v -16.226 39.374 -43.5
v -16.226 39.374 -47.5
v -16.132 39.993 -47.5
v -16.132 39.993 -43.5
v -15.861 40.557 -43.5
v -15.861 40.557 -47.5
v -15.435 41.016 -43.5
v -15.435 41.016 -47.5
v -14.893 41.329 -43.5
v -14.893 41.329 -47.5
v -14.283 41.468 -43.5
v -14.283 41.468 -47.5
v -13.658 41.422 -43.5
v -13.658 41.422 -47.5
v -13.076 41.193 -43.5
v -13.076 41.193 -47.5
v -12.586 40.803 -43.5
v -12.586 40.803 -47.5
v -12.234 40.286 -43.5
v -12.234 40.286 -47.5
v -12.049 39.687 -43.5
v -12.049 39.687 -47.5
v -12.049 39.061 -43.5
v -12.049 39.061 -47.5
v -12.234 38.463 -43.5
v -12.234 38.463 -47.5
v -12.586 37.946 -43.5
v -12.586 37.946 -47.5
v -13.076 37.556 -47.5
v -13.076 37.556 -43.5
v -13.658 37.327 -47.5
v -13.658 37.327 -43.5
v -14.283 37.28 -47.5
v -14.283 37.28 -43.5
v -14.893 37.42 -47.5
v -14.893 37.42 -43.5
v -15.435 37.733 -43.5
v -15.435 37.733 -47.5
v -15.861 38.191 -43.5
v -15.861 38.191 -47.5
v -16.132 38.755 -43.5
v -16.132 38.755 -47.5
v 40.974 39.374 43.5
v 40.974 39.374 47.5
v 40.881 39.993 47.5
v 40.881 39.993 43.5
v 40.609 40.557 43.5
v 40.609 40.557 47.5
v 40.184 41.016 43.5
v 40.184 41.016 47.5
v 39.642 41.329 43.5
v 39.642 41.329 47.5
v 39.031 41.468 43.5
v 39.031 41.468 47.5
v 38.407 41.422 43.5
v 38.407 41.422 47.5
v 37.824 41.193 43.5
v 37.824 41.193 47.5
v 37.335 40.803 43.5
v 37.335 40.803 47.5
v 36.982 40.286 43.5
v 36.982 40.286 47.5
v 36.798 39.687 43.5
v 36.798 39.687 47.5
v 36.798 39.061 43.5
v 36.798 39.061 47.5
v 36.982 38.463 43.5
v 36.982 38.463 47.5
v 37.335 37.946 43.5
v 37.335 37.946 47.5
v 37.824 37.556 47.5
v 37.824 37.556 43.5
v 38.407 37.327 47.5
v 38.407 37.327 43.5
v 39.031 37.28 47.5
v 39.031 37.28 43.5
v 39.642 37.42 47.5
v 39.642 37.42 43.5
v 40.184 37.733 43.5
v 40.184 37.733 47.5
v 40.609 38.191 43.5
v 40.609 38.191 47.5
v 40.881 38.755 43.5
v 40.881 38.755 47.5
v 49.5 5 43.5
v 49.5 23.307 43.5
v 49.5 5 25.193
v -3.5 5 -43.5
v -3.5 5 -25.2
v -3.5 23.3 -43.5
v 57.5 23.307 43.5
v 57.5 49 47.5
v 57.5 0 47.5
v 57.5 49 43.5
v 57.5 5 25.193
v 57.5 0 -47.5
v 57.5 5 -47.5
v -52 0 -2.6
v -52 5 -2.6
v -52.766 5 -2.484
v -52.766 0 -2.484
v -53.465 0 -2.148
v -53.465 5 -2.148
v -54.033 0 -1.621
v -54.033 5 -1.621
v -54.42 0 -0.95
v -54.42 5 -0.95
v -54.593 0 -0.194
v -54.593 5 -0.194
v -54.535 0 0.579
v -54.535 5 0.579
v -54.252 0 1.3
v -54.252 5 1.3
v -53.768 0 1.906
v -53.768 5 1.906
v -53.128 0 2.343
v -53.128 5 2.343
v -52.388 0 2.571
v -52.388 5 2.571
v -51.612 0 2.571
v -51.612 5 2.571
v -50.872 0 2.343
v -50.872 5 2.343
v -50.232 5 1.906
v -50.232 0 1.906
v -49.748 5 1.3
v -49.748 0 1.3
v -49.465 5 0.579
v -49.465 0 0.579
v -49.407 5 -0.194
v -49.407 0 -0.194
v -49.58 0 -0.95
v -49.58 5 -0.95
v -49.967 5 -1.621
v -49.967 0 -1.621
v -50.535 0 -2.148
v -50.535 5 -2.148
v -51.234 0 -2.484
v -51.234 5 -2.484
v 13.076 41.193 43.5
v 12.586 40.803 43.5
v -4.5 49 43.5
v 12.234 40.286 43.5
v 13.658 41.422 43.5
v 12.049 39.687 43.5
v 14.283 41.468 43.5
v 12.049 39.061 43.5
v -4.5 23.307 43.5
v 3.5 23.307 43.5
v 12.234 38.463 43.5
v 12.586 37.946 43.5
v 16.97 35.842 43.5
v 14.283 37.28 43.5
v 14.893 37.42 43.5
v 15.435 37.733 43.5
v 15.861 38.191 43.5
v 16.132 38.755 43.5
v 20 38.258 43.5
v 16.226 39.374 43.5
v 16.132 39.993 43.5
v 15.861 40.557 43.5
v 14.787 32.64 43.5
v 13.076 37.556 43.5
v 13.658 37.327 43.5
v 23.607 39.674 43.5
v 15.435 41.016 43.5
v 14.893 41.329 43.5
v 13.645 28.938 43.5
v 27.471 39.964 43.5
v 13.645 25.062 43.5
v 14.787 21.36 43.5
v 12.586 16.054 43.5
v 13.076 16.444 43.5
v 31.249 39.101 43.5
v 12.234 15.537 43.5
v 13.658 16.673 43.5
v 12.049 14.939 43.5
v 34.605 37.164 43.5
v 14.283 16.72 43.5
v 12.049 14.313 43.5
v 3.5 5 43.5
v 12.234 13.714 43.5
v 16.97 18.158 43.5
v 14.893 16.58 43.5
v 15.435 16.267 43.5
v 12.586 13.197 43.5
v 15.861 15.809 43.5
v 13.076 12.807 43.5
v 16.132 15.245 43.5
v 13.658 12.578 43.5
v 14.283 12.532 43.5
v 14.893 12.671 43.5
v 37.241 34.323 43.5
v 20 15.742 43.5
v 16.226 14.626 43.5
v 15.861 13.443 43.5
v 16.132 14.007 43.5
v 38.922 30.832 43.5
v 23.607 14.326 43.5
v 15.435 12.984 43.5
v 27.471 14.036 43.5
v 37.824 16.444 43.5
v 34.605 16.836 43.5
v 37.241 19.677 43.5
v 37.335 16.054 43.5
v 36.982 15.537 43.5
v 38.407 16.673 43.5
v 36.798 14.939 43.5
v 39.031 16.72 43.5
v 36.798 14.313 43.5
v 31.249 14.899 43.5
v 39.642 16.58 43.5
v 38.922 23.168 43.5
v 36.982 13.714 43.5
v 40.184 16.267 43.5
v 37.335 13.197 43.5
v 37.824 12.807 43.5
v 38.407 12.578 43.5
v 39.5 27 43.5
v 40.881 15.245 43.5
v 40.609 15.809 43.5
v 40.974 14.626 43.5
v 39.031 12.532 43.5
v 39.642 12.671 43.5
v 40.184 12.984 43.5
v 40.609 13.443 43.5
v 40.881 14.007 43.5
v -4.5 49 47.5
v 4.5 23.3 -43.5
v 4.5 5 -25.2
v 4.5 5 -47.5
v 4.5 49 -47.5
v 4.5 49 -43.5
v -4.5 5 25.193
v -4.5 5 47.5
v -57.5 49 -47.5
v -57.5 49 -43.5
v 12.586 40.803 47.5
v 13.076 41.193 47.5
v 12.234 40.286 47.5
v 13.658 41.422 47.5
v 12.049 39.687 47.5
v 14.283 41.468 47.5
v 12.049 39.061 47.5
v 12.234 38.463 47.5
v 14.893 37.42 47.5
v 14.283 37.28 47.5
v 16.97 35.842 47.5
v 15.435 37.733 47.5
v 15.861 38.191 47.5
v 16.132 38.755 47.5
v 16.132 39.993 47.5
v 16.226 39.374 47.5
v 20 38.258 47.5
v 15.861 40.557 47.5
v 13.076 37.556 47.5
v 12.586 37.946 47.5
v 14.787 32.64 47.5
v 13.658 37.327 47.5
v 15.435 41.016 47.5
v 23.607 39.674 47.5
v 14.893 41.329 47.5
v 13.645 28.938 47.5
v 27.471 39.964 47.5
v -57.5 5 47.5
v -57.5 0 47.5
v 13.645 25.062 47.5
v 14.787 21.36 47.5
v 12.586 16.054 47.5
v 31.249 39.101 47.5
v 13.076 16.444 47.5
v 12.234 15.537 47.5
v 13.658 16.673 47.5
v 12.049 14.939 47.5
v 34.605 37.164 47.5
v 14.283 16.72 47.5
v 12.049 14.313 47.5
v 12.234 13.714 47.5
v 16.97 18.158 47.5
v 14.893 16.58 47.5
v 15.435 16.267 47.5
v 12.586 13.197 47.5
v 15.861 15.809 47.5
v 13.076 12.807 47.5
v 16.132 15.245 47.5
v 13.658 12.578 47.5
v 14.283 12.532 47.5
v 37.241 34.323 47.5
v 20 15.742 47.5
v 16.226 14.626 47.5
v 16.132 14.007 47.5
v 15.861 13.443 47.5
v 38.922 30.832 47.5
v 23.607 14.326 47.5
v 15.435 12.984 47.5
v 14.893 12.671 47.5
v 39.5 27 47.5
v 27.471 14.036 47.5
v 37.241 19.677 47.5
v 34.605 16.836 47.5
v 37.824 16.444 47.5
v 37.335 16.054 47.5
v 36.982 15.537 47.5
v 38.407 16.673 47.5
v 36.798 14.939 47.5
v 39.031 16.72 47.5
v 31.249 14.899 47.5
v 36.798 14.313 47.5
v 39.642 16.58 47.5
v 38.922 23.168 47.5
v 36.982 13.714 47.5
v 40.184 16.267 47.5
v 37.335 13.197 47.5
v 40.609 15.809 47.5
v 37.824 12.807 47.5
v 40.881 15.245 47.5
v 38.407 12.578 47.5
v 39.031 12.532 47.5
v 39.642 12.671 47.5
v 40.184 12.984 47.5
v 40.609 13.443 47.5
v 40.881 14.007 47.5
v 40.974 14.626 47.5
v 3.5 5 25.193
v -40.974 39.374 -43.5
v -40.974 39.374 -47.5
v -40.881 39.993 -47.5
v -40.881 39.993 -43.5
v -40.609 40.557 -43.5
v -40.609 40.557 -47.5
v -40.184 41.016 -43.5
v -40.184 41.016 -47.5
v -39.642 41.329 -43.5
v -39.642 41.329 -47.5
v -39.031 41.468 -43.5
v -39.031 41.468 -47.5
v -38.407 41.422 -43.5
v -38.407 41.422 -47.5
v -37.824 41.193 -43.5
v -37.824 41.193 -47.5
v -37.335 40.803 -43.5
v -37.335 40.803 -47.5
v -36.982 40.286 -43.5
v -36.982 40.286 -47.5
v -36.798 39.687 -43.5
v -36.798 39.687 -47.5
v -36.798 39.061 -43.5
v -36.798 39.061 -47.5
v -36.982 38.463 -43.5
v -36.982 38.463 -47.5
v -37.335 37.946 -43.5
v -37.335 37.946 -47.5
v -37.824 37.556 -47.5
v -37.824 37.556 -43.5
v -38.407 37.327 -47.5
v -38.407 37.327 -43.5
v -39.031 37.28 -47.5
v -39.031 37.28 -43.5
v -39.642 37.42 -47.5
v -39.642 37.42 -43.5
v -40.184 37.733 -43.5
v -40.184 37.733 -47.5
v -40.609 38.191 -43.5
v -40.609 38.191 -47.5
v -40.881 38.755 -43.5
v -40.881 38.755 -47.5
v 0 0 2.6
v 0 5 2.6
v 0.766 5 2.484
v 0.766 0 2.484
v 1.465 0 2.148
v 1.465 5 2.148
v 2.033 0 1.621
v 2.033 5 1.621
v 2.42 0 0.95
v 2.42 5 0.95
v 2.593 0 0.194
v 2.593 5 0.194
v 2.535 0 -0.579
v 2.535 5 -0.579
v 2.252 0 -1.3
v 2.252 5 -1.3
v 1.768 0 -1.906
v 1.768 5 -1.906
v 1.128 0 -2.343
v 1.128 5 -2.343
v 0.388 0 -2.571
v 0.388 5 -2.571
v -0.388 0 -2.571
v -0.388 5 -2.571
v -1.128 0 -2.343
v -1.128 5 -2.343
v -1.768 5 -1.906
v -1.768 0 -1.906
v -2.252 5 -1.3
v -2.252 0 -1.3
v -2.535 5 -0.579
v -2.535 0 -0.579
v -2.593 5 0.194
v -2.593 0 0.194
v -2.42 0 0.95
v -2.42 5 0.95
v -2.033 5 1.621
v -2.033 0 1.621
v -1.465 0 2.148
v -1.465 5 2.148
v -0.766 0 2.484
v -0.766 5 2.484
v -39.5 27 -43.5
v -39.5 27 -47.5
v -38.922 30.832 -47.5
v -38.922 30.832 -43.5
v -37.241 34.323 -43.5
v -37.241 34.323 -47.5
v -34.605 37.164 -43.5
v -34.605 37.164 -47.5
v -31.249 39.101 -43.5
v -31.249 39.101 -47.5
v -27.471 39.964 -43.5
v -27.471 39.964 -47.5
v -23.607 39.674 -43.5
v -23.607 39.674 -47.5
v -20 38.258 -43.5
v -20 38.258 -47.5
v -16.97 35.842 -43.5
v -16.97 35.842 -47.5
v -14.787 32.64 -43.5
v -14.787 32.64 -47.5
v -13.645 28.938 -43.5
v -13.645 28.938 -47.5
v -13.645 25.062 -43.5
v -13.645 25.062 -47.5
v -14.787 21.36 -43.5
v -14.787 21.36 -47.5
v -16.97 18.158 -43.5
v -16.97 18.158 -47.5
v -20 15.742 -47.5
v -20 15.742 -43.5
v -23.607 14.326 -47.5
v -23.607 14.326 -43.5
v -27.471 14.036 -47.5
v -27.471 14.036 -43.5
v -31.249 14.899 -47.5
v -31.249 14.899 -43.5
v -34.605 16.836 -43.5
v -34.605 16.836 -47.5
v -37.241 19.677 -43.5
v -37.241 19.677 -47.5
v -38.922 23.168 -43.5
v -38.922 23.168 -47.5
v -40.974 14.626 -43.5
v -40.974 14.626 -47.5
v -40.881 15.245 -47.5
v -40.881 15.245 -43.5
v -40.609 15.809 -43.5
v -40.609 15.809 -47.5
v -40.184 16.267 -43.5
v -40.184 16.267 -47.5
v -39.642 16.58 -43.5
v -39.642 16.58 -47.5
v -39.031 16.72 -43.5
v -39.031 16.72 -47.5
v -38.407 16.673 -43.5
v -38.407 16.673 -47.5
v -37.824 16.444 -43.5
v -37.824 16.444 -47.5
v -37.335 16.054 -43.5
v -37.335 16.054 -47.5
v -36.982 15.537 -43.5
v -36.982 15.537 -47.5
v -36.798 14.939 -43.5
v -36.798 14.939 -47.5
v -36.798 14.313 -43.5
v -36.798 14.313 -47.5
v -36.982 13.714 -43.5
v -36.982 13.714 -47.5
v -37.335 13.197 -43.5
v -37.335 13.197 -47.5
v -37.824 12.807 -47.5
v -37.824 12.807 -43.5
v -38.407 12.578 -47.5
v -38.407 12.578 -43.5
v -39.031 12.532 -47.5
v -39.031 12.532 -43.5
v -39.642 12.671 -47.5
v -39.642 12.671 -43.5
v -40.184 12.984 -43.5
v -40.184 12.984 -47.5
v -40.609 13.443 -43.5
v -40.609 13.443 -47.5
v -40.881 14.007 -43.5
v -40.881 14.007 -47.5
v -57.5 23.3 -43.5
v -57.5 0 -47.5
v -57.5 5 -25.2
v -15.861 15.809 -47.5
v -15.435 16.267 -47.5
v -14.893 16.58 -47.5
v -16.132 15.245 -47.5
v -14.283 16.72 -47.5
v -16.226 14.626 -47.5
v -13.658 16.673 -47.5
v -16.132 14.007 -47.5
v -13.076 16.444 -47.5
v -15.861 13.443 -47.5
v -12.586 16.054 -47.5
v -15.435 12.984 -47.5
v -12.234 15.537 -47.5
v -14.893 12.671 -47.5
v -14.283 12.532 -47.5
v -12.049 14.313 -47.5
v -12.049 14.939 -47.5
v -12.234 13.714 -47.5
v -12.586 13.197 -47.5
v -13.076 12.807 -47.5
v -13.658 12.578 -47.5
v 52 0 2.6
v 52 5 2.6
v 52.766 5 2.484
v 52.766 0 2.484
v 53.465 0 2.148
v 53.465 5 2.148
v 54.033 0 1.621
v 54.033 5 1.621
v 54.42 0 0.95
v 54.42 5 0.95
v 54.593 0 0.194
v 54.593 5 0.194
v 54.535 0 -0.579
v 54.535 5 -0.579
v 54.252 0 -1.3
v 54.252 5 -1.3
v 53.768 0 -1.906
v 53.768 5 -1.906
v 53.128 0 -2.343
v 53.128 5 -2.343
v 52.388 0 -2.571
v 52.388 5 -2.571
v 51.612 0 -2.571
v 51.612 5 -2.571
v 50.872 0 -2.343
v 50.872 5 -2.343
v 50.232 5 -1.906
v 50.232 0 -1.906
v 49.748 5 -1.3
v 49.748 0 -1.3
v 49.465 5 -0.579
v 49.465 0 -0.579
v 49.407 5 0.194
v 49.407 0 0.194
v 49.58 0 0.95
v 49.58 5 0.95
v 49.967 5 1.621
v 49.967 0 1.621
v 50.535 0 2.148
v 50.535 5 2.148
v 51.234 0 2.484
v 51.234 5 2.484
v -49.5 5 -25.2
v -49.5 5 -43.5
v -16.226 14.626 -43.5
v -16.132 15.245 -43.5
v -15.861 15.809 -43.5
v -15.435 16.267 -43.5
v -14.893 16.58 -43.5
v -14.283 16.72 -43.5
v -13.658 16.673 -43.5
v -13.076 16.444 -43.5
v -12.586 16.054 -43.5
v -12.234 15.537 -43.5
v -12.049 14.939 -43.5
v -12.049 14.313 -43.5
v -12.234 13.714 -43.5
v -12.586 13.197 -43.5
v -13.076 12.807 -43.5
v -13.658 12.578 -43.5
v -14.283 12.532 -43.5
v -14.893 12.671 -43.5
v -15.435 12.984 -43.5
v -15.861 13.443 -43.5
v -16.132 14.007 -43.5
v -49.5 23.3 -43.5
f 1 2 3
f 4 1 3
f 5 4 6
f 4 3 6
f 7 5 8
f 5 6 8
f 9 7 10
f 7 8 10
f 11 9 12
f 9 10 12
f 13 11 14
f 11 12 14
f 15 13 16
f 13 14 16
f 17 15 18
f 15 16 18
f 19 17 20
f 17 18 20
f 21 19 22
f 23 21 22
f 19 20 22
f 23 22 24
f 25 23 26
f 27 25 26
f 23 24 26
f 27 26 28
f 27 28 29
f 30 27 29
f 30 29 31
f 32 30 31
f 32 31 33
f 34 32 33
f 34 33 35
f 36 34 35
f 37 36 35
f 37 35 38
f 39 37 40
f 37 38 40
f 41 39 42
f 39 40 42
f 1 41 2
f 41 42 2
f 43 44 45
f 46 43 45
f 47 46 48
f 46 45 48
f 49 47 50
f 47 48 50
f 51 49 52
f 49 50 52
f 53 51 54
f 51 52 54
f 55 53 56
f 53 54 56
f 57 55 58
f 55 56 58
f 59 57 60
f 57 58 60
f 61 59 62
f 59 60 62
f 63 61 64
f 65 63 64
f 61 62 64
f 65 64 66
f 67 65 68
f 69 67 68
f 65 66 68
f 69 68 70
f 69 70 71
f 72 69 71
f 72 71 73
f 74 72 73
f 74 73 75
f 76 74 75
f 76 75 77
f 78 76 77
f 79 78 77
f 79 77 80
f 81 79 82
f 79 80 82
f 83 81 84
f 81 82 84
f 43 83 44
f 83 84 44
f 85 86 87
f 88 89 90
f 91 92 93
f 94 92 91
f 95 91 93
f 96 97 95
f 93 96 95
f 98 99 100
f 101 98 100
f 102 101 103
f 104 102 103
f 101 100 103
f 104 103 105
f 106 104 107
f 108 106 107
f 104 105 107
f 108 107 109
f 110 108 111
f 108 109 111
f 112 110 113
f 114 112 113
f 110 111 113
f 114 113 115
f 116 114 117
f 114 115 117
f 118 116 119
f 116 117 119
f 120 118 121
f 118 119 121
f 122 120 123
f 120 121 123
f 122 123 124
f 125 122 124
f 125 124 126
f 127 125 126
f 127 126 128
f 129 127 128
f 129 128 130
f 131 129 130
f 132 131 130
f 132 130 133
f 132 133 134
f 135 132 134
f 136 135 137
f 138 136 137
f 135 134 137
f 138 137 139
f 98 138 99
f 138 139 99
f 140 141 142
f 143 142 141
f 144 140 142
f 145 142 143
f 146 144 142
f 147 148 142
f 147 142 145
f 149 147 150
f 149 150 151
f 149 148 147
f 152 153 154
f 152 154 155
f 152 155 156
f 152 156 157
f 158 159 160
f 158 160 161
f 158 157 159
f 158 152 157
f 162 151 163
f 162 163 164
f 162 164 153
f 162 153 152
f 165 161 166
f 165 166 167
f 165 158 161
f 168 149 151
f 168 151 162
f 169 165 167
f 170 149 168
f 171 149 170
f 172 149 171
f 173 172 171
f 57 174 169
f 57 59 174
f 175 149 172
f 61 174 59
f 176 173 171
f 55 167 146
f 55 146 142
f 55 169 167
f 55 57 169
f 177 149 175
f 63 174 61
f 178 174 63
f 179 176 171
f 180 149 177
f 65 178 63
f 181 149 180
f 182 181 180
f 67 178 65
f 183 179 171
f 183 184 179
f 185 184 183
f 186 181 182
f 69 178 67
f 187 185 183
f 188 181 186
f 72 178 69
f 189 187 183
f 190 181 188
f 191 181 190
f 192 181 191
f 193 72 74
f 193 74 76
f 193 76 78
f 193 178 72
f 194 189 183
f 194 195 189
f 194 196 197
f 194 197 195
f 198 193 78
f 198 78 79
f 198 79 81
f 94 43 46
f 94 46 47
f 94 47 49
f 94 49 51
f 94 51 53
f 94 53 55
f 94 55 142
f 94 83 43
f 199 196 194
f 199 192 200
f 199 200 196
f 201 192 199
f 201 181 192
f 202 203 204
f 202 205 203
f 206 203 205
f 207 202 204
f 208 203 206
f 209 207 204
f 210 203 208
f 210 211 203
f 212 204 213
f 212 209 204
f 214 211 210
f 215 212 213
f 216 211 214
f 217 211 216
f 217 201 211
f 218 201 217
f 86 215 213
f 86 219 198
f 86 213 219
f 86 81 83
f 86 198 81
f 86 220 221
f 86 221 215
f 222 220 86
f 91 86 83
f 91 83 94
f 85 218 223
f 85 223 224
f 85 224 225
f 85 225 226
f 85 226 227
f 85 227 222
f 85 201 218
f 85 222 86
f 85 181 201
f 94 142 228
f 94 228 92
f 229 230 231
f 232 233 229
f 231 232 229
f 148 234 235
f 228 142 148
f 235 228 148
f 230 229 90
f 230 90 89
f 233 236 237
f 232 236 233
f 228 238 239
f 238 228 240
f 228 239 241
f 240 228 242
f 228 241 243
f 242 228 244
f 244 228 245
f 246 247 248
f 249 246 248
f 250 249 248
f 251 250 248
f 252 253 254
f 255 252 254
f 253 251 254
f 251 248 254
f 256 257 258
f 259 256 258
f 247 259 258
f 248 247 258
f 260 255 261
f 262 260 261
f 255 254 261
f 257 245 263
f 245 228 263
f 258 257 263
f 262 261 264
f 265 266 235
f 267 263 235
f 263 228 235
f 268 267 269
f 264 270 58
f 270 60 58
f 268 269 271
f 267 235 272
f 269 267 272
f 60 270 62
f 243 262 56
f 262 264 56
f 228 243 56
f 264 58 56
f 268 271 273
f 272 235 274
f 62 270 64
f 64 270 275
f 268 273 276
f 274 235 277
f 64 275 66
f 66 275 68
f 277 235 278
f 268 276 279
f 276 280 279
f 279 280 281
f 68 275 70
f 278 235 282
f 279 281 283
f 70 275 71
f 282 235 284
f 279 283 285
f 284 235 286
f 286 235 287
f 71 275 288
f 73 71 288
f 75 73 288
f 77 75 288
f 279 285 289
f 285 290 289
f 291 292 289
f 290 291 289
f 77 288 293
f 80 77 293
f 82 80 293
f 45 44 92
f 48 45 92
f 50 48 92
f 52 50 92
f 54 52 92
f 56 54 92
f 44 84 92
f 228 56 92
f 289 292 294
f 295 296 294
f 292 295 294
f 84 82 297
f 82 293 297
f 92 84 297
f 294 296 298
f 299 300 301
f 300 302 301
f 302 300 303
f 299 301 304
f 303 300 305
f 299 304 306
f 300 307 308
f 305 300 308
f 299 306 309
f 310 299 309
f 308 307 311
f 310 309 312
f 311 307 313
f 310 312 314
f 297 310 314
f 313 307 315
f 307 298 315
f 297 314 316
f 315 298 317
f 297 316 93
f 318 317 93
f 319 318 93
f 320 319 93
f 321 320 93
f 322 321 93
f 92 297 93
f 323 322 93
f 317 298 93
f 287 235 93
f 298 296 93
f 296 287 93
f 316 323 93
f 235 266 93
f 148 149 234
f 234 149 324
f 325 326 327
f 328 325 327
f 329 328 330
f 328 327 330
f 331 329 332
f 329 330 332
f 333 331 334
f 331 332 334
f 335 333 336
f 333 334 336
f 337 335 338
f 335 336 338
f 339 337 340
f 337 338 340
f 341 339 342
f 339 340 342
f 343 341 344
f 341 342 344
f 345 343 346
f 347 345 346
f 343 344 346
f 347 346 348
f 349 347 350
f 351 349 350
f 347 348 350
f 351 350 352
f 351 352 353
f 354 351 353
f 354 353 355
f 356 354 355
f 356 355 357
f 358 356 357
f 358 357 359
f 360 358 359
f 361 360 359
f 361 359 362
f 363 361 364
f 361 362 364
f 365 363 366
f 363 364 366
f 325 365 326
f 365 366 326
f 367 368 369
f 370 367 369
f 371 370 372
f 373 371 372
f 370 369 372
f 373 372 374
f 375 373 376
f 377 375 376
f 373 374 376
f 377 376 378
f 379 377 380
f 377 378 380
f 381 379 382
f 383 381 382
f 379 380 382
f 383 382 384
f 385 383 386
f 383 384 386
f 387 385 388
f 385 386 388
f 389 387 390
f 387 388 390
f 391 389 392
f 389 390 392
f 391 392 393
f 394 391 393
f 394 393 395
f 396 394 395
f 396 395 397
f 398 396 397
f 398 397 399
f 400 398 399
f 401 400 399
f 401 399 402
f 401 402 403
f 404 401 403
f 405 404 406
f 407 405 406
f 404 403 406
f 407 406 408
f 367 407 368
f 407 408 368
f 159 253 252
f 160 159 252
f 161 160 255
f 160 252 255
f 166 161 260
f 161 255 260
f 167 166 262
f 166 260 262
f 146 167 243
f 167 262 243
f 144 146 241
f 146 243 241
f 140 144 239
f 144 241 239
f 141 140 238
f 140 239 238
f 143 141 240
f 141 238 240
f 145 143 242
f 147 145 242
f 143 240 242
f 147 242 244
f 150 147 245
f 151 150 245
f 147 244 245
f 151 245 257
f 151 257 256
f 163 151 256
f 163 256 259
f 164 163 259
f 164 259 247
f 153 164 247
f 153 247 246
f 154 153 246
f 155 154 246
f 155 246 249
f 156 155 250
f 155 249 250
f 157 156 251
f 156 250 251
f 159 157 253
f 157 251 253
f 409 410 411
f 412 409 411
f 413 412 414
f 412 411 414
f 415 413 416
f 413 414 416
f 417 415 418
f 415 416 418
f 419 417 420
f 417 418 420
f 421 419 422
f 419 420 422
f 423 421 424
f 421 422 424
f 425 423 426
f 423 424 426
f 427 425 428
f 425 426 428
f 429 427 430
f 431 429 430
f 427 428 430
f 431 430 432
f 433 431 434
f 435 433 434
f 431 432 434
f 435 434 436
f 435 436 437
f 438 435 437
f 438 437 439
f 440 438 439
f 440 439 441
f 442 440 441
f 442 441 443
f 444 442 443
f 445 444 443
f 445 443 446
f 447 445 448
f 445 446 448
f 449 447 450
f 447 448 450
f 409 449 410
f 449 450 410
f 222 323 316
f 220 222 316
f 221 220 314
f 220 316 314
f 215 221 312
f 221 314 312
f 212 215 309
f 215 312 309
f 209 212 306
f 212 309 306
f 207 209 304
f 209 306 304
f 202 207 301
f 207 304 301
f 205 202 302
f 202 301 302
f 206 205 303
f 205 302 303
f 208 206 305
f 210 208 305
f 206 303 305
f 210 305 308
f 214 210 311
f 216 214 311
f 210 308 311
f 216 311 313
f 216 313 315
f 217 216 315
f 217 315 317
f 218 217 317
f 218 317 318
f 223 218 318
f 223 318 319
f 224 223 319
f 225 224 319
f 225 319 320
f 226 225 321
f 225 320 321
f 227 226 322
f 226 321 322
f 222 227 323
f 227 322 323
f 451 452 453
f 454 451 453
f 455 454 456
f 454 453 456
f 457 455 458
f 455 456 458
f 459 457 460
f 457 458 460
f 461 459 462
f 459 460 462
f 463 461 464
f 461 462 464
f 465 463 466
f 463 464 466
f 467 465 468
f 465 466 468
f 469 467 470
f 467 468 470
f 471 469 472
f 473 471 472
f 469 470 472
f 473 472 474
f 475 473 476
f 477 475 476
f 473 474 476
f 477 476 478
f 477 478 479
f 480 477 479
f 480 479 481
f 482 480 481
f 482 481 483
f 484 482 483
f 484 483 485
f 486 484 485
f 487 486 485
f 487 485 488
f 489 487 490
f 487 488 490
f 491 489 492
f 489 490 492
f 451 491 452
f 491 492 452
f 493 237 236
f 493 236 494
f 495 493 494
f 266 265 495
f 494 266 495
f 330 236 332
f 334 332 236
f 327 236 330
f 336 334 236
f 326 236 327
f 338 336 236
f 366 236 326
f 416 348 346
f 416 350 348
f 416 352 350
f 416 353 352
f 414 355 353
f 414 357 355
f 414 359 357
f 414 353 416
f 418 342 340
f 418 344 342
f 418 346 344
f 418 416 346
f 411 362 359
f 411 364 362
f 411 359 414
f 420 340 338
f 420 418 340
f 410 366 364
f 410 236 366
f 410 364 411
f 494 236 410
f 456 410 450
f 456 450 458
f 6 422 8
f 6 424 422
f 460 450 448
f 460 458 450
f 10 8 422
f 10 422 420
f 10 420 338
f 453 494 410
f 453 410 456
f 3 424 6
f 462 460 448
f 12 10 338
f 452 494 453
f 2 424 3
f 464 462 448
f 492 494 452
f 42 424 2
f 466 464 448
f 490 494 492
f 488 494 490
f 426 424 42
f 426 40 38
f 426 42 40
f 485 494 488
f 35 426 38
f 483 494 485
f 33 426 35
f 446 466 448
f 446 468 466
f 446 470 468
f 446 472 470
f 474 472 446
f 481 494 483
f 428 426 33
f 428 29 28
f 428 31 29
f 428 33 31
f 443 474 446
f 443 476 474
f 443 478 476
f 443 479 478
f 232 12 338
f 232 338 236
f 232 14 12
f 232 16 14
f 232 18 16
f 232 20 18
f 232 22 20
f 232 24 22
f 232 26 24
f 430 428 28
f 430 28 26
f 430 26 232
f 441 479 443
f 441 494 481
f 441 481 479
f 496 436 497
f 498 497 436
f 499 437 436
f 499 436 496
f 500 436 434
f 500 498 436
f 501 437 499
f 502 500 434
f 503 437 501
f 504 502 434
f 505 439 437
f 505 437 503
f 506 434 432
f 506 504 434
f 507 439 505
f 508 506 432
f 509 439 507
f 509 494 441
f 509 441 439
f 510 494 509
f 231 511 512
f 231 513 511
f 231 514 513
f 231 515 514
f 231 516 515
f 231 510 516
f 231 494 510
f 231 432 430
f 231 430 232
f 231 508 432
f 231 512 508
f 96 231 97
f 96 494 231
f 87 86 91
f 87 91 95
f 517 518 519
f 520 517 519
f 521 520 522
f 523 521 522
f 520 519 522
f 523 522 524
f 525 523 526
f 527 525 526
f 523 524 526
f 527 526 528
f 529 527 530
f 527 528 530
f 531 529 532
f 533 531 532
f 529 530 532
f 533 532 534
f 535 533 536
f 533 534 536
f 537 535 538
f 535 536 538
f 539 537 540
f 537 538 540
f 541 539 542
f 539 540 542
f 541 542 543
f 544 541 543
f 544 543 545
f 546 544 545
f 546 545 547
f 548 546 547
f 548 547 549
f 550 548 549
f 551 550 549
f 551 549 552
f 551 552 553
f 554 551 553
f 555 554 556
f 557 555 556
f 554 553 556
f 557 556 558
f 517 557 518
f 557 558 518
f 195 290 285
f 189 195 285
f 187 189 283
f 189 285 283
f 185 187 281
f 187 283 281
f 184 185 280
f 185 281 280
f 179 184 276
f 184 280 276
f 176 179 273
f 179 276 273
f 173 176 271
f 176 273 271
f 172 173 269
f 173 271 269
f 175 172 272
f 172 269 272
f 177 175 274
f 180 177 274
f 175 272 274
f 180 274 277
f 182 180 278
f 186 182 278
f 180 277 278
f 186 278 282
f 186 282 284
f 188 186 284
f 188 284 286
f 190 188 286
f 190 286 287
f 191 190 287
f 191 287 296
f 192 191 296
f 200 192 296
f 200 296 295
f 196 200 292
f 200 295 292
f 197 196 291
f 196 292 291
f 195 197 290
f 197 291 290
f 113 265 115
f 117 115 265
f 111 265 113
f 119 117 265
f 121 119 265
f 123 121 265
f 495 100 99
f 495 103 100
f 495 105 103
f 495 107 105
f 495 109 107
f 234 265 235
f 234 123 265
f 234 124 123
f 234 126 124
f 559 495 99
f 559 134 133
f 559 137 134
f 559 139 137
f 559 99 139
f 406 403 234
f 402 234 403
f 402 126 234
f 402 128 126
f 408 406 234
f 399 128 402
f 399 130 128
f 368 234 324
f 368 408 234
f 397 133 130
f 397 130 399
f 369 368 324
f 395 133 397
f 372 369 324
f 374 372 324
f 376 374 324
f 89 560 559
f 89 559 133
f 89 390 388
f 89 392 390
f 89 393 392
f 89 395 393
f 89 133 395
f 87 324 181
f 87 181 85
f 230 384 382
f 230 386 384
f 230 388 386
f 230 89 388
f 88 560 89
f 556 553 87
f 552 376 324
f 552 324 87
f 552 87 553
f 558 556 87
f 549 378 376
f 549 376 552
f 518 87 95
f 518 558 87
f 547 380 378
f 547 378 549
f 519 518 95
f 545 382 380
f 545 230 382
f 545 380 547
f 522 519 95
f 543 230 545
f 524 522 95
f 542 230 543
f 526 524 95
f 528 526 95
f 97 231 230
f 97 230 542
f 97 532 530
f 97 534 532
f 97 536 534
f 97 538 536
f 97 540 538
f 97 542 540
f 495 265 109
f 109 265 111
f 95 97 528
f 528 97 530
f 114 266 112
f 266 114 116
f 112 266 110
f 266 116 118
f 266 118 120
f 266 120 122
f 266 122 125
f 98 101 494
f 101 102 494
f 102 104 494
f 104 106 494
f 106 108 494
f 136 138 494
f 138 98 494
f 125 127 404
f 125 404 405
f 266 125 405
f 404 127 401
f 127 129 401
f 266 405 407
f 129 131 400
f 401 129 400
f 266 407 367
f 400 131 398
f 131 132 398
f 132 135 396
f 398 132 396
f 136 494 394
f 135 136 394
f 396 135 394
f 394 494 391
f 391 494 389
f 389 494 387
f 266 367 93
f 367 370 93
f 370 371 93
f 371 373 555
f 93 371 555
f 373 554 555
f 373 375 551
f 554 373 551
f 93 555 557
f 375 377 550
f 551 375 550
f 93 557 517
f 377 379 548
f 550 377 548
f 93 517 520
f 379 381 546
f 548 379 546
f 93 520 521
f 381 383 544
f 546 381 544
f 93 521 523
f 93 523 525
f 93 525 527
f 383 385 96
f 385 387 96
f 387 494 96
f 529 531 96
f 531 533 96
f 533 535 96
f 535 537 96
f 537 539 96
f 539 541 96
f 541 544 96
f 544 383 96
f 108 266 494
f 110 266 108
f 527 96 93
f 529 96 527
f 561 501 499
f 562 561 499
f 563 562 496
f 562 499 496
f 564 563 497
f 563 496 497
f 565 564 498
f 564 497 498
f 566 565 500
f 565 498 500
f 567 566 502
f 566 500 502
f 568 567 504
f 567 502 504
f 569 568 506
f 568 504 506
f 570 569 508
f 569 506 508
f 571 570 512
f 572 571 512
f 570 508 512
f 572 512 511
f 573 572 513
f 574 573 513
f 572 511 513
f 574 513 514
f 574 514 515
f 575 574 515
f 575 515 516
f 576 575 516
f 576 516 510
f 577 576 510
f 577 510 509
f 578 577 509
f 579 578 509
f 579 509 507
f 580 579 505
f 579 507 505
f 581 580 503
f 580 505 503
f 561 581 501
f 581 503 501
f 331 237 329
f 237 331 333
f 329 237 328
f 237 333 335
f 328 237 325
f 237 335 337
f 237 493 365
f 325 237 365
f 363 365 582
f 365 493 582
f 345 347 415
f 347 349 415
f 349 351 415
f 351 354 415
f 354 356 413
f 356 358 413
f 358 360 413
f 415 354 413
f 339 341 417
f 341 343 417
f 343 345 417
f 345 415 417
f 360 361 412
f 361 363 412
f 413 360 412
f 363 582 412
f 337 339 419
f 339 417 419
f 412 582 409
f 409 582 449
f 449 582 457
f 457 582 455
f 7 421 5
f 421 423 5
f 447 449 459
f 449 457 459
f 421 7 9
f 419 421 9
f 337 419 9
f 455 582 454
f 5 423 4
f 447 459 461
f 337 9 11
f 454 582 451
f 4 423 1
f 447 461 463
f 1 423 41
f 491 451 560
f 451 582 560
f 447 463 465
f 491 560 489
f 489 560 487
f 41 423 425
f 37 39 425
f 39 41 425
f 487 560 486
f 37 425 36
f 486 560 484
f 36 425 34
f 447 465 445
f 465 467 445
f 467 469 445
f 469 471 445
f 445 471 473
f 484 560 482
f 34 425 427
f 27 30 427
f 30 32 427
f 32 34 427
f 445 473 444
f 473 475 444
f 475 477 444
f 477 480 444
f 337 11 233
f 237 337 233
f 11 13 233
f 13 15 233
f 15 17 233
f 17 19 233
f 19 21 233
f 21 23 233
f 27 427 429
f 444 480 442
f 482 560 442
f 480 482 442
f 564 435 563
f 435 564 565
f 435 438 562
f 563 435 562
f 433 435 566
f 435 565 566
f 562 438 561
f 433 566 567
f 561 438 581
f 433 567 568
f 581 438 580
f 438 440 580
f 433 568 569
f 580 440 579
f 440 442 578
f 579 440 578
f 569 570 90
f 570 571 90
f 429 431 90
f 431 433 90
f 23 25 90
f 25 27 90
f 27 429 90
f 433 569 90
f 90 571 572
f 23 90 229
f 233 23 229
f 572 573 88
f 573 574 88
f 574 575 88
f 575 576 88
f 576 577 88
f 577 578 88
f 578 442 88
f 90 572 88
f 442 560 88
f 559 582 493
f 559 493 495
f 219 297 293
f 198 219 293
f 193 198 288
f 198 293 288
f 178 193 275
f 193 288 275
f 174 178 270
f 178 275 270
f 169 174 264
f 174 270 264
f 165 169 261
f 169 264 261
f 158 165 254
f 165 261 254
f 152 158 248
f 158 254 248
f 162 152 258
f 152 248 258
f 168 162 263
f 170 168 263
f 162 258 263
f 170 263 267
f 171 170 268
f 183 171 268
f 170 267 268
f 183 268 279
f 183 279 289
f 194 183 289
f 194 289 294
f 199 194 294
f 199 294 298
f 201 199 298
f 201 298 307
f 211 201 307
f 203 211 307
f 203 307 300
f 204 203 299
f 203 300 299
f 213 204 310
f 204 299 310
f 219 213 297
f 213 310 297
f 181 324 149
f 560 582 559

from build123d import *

# Parameters (mm, degrees)
SKETCH2_W           = 115
SKETCH2_H           = 95
BOSS_EXTRUDE1_DEPTH = 5
SKETCH3_W           = 62
SKETCH3_H           = 4
BOSS_EXTRUDE2_DEPTH = 44
RIB1_REACH          = 135.725
SKETCH5_WALL_W      = 295.338836254
SKETCH5_WALL_H      = 8
RIB2_REACH          = 94.202
SKETCH6_WALL_W      = 212.294222484
SKETCH6_WALL_H      = 8
RIB6_REACH          = 135.725
SKETCH7_WALL_W      = 295.32906057
SKETCH7_WALL_H      = 8
BOSS_EXTRUDE3_DEPTH = 8
SKETCH11_R          = 13
SKETCH11_R_2        = 2.1
CUT_EXTRUDE1_DEPTH  = 4
SKETCH12_R          = 13
SKETCH12_R_2        = 2.1
CUT_EXTRUDE2_DEPTH  = 4
SKETCH13_R          = 2.6
CUT_EXTRUDE3_DEPTH  = 5


with BuildPart() as part:
    # Sketch2 → Boss-Extrude1 (new body)
    with BuildSketch(Plane(origin=(0, 0, 0), x_dir=(1, 0, 0), z_dir=(0, 1, 0))):
        Rectangle(SKETCH2_W, SKETCH2_H)
    extrude(amount=BOSS_EXTRUDE1_DEPTH)

    # Sketch3 → Boss-Extrude2 (add)
    with BuildSketch(Plane(origin=(0, 5, 0), x_dir=(1, 0, 0), z_dir=(0, 1, 0))):
        with Locations((-26.5, 45.5)):
            Rectangle(SKETCH3_W, SKETCH3_H)
        with Locations((26.5, -45.5)):
            Rectangle(SKETCH3_W, SKETCH3_H)
    extrude(amount=BOSS_EXTRUDE2_DEPTH)

    # Sketch5 wall → Rib1 (add, up to next)
    with BuildSketch(Plane(origin=(57.5, 14.153417974, 34.346582025), x_dir=(0, -0.707106781187, -0.707106781187), z_dir=(0, 0.707106781187, -0.707106781187)), mode=Mode.PRIVATE) as rib1_sk1:
        with Locations((0, 4)):
            Rectangle(SKETCH5_WALL_W, SKETCH5_WALL_H)
    rib1_tool1 = extrude(rib1_sk1.sketch, amount=-RIB1_REACH, mode=Mode.PRIVATE) - part.part
    add(rib1_tool1.solids().sort_by_distance((57.5, 14.153417974, 34.346582025))[0])

    # Sketch6 wall → Rib2 (add, up to next)
    with BuildSketch(Plane(origin=(-4.5, 14.153417974, 34.346582025), x_dir=(0, 0.707106781187, 0.707106781187), z_dir=(0, 0.707106781187, -0.707106781187)), mode=Mode.PRIVATE) as rib2_sk1:
        with Locations((0, 4)):
            Rectangle(SKETCH6_WALL_W, SKETCH6_WALL_H)
    rib2_tool1 = extrude(rib2_sk1.sketch, amount=-RIB2_REACH, mode=Mode.PRIVATE) - part.part
    add(rib2_tool1.solids().sort_by_distance((-4.5, 14.153417974, 34.346582025))[0])

    # Sketch7 wall → Rib6 (add, up to next)
    with BuildSketch(Plane(origin=(-57.5, 14.149961749, -34.350038251), x_dir=(0, -0.707106781187, 0.707106781187), z_dir=(0, 0.707106781187, 0.707106781187)), mode=Mode.PRIVATE) as rib6_sk1:
        with Locations((0, 4)):
            Rectangle(SKETCH7_WALL_W, SKETCH7_WALL_H)
    rib6_tool1 = extrude(rib6_sk1.sketch, amount=-RIB6_REACH, mode=Mode.PRIVATE) - part.part
    add(rib6_tool1.solids().sort_by_distance((-57.5, 14.149961749, -34.350038251))[0])

    # Sketch9 → Boss-Extrude3 (add)
    with BuildSketch(Plane(origin=(4.5, 0, 0), x_dir=(0, 0, -1), z_dir=(1, 0, 0))):
        Polygon((43.5, 23.299923497), (25.200076503, 5), (43.5, 5), align=None)
    extrude(amount=-BOSS_EXTRUDE3_DEPTH)

    # Sketch11 → Cut-Extrude1 (cut)
    with BuildSketch(Plane(origin=(0, 0, -47.5), x_dir=(-1, 0, 0), z_dir=(0, 0, -1))):
        with Locations((26.5, 27)):
            Circle(SKETCH11_R)
        with Locations((38.874368671, 39.374368671)):
            Circle(SKETCH11_R_2)
        with Locations((38.874368671, 14.625631329)):
            Circle(SKETCH11_R_2)
        with Locations((14.125631329, 14.625631329)):
            Circle(SKETCH11_R_2)
        with Locations((14.125631329, 39.374368671)):
            Circle(SKETCH11_R_2)
    extrude(amount=-CUT_EXTRUDE1_DEPTH, mode=Mode.SUBTRACT)

    # Sketch12 → Cut-Extrude2 (cut)
    with BuildSketch(Plane.XY.offset(47.5)):
        with Locations((26.5, 27)):
            Circle(SKETCH12_R)
        with Locations((38.874368671, 39.374368671)):
            Circle(SKETCH12_R_2)
        with Locations((38.874368671, 14.625631329)):
            Circle(SKETCH12_R_2)
        with Locations((14.125631329, 14.625631329)):
            Circle(SKETCH12_R_2)
        with Locations((14.125631329, 39.374368671)):
            Circle(SKETCH12_R_2)
    extrude(amount=-CUT_EXTRUDE2_DEPTH, mode=Mode.SUBTRACT)

    # Sketch13 → Cut-Extrude3 (cut)
    with BuildSketch(Plane(origin=(0, 5, 0), x_dir=(1, 0, 0), z_dir=(0, 1, 0))):
        Circle(SKETCH13_R)
        with Locations((52, 0)):
            Circle(SKETCH13_R)
        with Locations((-52, 0)):
            Circle(SKETCH13_R)
    extrude(amount=-CUT_EXTRUDE3_DEPTH, mode=Mode.SUBTRACT)


solid = part.part
